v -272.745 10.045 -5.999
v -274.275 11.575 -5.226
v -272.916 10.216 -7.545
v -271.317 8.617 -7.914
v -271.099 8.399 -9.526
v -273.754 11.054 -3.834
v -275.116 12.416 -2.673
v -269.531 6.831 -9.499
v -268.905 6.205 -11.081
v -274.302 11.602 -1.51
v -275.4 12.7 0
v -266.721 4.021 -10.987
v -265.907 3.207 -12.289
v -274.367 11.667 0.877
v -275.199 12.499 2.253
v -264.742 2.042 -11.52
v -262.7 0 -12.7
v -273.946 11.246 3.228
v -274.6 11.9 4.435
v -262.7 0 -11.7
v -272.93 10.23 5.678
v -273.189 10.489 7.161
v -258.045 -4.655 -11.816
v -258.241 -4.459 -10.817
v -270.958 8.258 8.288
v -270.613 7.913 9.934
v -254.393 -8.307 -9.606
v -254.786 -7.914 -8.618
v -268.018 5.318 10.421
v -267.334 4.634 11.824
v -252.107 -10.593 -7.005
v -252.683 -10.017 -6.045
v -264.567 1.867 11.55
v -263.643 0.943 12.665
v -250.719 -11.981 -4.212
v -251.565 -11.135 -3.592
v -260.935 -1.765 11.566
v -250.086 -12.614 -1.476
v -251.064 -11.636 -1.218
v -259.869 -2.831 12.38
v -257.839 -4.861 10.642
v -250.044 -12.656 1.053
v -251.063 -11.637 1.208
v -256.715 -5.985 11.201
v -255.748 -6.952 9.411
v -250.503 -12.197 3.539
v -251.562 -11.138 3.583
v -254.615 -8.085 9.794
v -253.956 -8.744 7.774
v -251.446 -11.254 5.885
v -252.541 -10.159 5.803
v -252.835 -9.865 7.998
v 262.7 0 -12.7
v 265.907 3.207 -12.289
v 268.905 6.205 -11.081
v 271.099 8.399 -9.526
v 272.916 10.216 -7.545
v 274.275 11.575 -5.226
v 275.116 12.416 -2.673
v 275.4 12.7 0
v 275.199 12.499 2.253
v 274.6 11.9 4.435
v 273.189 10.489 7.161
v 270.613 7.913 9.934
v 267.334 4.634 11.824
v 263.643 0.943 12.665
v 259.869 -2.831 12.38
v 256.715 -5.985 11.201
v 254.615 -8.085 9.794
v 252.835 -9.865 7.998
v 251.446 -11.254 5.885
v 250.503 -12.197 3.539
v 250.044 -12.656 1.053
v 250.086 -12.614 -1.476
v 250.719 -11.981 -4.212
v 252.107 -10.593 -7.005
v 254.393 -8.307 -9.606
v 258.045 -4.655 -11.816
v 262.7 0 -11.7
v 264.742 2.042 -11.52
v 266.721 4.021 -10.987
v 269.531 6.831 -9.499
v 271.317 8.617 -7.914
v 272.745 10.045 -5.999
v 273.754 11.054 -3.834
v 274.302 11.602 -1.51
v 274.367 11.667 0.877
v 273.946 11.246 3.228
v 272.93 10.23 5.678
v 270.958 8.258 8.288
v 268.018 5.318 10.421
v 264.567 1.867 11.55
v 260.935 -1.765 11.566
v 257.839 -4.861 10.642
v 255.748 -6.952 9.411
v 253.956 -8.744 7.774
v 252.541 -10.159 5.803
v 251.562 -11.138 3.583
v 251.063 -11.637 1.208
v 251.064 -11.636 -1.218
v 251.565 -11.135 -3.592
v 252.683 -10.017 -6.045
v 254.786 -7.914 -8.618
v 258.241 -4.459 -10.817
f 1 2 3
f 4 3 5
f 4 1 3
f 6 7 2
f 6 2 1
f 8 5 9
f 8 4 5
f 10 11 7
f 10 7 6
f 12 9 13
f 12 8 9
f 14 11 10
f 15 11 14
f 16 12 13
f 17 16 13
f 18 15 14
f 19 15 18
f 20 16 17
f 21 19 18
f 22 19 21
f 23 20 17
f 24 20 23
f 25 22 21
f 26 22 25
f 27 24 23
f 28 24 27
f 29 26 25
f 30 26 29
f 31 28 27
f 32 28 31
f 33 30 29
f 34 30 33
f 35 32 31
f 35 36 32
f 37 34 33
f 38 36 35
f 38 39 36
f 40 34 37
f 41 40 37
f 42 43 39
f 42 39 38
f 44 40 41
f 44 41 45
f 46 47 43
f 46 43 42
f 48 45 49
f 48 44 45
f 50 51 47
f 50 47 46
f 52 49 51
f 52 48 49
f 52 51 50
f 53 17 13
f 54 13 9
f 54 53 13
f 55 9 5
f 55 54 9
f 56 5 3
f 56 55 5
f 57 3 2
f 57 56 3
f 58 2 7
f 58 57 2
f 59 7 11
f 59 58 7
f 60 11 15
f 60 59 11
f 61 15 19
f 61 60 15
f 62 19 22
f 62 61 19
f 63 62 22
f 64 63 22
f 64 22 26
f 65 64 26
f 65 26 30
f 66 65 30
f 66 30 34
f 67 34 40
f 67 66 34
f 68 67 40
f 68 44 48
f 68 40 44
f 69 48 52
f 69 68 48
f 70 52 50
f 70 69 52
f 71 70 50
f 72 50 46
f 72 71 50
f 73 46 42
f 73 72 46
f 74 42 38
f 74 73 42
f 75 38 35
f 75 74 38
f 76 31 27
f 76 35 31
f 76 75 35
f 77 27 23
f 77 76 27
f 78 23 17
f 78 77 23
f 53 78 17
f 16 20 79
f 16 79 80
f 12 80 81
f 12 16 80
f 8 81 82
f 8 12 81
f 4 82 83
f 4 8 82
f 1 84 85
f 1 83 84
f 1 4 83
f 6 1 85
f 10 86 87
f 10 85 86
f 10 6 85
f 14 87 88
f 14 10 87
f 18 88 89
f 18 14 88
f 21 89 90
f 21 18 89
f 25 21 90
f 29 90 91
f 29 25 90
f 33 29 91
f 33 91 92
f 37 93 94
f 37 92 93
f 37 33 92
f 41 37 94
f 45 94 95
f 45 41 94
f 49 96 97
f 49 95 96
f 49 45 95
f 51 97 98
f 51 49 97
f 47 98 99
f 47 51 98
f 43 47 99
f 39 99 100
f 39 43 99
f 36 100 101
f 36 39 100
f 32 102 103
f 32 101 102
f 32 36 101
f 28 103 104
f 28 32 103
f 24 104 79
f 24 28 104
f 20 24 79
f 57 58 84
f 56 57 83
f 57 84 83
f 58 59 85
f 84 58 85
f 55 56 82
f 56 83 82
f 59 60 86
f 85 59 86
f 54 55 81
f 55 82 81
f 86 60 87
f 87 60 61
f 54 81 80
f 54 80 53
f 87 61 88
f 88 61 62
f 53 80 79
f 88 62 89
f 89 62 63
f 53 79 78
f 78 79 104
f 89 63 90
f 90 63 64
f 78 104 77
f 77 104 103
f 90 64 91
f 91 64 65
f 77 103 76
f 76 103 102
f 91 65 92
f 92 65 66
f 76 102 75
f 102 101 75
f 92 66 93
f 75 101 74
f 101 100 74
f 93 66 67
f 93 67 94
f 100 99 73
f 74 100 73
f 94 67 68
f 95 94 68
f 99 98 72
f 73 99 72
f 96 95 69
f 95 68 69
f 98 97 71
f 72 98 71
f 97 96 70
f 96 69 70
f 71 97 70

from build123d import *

# Parameters (mm, degrees)
SKETCH1_R           = 12.7
SKETCH1_R_2         = 11.7
EXTRUDE_THIN1_DEPTH = 275.4


with BuildPart() as part:
    # Sketch1 → Extrude-Thin1 (new, symmetric)
    with BuildSketch(Plane(origin=(0, 0, 0), x_dir=(0, 0, -1), z_dir=(1, 0, 0))):
        Circle(SKETCH1_R)
        Circle(SKETCH1_R_2, mode=Mode.SUBTRACT)
    extrude(amount=EXTRUDE_THIN1_DEPTH, both=True)

    # SurfaceCut1
    split(bisect_by=Plane(origin=(131.35, -131.35, 0), x_dir=(-0.7071067811865472, -0.7071067811865478, 0), z_dir=(-0.7071067811865478, 0.7071067811865472, 0)), keep=Keep.TOP)

    # SurfaceCut2
    split(bisect_by=Plane(origin=(-131.35, -131.35, 0), x_dir=(0.7071067811865515, -0.7071067811865436, 0), z_dir=(-0.7071067811865436, -0.7071067811865515, 0)), keep=Keep.BOTTOM)


solid = part.part
